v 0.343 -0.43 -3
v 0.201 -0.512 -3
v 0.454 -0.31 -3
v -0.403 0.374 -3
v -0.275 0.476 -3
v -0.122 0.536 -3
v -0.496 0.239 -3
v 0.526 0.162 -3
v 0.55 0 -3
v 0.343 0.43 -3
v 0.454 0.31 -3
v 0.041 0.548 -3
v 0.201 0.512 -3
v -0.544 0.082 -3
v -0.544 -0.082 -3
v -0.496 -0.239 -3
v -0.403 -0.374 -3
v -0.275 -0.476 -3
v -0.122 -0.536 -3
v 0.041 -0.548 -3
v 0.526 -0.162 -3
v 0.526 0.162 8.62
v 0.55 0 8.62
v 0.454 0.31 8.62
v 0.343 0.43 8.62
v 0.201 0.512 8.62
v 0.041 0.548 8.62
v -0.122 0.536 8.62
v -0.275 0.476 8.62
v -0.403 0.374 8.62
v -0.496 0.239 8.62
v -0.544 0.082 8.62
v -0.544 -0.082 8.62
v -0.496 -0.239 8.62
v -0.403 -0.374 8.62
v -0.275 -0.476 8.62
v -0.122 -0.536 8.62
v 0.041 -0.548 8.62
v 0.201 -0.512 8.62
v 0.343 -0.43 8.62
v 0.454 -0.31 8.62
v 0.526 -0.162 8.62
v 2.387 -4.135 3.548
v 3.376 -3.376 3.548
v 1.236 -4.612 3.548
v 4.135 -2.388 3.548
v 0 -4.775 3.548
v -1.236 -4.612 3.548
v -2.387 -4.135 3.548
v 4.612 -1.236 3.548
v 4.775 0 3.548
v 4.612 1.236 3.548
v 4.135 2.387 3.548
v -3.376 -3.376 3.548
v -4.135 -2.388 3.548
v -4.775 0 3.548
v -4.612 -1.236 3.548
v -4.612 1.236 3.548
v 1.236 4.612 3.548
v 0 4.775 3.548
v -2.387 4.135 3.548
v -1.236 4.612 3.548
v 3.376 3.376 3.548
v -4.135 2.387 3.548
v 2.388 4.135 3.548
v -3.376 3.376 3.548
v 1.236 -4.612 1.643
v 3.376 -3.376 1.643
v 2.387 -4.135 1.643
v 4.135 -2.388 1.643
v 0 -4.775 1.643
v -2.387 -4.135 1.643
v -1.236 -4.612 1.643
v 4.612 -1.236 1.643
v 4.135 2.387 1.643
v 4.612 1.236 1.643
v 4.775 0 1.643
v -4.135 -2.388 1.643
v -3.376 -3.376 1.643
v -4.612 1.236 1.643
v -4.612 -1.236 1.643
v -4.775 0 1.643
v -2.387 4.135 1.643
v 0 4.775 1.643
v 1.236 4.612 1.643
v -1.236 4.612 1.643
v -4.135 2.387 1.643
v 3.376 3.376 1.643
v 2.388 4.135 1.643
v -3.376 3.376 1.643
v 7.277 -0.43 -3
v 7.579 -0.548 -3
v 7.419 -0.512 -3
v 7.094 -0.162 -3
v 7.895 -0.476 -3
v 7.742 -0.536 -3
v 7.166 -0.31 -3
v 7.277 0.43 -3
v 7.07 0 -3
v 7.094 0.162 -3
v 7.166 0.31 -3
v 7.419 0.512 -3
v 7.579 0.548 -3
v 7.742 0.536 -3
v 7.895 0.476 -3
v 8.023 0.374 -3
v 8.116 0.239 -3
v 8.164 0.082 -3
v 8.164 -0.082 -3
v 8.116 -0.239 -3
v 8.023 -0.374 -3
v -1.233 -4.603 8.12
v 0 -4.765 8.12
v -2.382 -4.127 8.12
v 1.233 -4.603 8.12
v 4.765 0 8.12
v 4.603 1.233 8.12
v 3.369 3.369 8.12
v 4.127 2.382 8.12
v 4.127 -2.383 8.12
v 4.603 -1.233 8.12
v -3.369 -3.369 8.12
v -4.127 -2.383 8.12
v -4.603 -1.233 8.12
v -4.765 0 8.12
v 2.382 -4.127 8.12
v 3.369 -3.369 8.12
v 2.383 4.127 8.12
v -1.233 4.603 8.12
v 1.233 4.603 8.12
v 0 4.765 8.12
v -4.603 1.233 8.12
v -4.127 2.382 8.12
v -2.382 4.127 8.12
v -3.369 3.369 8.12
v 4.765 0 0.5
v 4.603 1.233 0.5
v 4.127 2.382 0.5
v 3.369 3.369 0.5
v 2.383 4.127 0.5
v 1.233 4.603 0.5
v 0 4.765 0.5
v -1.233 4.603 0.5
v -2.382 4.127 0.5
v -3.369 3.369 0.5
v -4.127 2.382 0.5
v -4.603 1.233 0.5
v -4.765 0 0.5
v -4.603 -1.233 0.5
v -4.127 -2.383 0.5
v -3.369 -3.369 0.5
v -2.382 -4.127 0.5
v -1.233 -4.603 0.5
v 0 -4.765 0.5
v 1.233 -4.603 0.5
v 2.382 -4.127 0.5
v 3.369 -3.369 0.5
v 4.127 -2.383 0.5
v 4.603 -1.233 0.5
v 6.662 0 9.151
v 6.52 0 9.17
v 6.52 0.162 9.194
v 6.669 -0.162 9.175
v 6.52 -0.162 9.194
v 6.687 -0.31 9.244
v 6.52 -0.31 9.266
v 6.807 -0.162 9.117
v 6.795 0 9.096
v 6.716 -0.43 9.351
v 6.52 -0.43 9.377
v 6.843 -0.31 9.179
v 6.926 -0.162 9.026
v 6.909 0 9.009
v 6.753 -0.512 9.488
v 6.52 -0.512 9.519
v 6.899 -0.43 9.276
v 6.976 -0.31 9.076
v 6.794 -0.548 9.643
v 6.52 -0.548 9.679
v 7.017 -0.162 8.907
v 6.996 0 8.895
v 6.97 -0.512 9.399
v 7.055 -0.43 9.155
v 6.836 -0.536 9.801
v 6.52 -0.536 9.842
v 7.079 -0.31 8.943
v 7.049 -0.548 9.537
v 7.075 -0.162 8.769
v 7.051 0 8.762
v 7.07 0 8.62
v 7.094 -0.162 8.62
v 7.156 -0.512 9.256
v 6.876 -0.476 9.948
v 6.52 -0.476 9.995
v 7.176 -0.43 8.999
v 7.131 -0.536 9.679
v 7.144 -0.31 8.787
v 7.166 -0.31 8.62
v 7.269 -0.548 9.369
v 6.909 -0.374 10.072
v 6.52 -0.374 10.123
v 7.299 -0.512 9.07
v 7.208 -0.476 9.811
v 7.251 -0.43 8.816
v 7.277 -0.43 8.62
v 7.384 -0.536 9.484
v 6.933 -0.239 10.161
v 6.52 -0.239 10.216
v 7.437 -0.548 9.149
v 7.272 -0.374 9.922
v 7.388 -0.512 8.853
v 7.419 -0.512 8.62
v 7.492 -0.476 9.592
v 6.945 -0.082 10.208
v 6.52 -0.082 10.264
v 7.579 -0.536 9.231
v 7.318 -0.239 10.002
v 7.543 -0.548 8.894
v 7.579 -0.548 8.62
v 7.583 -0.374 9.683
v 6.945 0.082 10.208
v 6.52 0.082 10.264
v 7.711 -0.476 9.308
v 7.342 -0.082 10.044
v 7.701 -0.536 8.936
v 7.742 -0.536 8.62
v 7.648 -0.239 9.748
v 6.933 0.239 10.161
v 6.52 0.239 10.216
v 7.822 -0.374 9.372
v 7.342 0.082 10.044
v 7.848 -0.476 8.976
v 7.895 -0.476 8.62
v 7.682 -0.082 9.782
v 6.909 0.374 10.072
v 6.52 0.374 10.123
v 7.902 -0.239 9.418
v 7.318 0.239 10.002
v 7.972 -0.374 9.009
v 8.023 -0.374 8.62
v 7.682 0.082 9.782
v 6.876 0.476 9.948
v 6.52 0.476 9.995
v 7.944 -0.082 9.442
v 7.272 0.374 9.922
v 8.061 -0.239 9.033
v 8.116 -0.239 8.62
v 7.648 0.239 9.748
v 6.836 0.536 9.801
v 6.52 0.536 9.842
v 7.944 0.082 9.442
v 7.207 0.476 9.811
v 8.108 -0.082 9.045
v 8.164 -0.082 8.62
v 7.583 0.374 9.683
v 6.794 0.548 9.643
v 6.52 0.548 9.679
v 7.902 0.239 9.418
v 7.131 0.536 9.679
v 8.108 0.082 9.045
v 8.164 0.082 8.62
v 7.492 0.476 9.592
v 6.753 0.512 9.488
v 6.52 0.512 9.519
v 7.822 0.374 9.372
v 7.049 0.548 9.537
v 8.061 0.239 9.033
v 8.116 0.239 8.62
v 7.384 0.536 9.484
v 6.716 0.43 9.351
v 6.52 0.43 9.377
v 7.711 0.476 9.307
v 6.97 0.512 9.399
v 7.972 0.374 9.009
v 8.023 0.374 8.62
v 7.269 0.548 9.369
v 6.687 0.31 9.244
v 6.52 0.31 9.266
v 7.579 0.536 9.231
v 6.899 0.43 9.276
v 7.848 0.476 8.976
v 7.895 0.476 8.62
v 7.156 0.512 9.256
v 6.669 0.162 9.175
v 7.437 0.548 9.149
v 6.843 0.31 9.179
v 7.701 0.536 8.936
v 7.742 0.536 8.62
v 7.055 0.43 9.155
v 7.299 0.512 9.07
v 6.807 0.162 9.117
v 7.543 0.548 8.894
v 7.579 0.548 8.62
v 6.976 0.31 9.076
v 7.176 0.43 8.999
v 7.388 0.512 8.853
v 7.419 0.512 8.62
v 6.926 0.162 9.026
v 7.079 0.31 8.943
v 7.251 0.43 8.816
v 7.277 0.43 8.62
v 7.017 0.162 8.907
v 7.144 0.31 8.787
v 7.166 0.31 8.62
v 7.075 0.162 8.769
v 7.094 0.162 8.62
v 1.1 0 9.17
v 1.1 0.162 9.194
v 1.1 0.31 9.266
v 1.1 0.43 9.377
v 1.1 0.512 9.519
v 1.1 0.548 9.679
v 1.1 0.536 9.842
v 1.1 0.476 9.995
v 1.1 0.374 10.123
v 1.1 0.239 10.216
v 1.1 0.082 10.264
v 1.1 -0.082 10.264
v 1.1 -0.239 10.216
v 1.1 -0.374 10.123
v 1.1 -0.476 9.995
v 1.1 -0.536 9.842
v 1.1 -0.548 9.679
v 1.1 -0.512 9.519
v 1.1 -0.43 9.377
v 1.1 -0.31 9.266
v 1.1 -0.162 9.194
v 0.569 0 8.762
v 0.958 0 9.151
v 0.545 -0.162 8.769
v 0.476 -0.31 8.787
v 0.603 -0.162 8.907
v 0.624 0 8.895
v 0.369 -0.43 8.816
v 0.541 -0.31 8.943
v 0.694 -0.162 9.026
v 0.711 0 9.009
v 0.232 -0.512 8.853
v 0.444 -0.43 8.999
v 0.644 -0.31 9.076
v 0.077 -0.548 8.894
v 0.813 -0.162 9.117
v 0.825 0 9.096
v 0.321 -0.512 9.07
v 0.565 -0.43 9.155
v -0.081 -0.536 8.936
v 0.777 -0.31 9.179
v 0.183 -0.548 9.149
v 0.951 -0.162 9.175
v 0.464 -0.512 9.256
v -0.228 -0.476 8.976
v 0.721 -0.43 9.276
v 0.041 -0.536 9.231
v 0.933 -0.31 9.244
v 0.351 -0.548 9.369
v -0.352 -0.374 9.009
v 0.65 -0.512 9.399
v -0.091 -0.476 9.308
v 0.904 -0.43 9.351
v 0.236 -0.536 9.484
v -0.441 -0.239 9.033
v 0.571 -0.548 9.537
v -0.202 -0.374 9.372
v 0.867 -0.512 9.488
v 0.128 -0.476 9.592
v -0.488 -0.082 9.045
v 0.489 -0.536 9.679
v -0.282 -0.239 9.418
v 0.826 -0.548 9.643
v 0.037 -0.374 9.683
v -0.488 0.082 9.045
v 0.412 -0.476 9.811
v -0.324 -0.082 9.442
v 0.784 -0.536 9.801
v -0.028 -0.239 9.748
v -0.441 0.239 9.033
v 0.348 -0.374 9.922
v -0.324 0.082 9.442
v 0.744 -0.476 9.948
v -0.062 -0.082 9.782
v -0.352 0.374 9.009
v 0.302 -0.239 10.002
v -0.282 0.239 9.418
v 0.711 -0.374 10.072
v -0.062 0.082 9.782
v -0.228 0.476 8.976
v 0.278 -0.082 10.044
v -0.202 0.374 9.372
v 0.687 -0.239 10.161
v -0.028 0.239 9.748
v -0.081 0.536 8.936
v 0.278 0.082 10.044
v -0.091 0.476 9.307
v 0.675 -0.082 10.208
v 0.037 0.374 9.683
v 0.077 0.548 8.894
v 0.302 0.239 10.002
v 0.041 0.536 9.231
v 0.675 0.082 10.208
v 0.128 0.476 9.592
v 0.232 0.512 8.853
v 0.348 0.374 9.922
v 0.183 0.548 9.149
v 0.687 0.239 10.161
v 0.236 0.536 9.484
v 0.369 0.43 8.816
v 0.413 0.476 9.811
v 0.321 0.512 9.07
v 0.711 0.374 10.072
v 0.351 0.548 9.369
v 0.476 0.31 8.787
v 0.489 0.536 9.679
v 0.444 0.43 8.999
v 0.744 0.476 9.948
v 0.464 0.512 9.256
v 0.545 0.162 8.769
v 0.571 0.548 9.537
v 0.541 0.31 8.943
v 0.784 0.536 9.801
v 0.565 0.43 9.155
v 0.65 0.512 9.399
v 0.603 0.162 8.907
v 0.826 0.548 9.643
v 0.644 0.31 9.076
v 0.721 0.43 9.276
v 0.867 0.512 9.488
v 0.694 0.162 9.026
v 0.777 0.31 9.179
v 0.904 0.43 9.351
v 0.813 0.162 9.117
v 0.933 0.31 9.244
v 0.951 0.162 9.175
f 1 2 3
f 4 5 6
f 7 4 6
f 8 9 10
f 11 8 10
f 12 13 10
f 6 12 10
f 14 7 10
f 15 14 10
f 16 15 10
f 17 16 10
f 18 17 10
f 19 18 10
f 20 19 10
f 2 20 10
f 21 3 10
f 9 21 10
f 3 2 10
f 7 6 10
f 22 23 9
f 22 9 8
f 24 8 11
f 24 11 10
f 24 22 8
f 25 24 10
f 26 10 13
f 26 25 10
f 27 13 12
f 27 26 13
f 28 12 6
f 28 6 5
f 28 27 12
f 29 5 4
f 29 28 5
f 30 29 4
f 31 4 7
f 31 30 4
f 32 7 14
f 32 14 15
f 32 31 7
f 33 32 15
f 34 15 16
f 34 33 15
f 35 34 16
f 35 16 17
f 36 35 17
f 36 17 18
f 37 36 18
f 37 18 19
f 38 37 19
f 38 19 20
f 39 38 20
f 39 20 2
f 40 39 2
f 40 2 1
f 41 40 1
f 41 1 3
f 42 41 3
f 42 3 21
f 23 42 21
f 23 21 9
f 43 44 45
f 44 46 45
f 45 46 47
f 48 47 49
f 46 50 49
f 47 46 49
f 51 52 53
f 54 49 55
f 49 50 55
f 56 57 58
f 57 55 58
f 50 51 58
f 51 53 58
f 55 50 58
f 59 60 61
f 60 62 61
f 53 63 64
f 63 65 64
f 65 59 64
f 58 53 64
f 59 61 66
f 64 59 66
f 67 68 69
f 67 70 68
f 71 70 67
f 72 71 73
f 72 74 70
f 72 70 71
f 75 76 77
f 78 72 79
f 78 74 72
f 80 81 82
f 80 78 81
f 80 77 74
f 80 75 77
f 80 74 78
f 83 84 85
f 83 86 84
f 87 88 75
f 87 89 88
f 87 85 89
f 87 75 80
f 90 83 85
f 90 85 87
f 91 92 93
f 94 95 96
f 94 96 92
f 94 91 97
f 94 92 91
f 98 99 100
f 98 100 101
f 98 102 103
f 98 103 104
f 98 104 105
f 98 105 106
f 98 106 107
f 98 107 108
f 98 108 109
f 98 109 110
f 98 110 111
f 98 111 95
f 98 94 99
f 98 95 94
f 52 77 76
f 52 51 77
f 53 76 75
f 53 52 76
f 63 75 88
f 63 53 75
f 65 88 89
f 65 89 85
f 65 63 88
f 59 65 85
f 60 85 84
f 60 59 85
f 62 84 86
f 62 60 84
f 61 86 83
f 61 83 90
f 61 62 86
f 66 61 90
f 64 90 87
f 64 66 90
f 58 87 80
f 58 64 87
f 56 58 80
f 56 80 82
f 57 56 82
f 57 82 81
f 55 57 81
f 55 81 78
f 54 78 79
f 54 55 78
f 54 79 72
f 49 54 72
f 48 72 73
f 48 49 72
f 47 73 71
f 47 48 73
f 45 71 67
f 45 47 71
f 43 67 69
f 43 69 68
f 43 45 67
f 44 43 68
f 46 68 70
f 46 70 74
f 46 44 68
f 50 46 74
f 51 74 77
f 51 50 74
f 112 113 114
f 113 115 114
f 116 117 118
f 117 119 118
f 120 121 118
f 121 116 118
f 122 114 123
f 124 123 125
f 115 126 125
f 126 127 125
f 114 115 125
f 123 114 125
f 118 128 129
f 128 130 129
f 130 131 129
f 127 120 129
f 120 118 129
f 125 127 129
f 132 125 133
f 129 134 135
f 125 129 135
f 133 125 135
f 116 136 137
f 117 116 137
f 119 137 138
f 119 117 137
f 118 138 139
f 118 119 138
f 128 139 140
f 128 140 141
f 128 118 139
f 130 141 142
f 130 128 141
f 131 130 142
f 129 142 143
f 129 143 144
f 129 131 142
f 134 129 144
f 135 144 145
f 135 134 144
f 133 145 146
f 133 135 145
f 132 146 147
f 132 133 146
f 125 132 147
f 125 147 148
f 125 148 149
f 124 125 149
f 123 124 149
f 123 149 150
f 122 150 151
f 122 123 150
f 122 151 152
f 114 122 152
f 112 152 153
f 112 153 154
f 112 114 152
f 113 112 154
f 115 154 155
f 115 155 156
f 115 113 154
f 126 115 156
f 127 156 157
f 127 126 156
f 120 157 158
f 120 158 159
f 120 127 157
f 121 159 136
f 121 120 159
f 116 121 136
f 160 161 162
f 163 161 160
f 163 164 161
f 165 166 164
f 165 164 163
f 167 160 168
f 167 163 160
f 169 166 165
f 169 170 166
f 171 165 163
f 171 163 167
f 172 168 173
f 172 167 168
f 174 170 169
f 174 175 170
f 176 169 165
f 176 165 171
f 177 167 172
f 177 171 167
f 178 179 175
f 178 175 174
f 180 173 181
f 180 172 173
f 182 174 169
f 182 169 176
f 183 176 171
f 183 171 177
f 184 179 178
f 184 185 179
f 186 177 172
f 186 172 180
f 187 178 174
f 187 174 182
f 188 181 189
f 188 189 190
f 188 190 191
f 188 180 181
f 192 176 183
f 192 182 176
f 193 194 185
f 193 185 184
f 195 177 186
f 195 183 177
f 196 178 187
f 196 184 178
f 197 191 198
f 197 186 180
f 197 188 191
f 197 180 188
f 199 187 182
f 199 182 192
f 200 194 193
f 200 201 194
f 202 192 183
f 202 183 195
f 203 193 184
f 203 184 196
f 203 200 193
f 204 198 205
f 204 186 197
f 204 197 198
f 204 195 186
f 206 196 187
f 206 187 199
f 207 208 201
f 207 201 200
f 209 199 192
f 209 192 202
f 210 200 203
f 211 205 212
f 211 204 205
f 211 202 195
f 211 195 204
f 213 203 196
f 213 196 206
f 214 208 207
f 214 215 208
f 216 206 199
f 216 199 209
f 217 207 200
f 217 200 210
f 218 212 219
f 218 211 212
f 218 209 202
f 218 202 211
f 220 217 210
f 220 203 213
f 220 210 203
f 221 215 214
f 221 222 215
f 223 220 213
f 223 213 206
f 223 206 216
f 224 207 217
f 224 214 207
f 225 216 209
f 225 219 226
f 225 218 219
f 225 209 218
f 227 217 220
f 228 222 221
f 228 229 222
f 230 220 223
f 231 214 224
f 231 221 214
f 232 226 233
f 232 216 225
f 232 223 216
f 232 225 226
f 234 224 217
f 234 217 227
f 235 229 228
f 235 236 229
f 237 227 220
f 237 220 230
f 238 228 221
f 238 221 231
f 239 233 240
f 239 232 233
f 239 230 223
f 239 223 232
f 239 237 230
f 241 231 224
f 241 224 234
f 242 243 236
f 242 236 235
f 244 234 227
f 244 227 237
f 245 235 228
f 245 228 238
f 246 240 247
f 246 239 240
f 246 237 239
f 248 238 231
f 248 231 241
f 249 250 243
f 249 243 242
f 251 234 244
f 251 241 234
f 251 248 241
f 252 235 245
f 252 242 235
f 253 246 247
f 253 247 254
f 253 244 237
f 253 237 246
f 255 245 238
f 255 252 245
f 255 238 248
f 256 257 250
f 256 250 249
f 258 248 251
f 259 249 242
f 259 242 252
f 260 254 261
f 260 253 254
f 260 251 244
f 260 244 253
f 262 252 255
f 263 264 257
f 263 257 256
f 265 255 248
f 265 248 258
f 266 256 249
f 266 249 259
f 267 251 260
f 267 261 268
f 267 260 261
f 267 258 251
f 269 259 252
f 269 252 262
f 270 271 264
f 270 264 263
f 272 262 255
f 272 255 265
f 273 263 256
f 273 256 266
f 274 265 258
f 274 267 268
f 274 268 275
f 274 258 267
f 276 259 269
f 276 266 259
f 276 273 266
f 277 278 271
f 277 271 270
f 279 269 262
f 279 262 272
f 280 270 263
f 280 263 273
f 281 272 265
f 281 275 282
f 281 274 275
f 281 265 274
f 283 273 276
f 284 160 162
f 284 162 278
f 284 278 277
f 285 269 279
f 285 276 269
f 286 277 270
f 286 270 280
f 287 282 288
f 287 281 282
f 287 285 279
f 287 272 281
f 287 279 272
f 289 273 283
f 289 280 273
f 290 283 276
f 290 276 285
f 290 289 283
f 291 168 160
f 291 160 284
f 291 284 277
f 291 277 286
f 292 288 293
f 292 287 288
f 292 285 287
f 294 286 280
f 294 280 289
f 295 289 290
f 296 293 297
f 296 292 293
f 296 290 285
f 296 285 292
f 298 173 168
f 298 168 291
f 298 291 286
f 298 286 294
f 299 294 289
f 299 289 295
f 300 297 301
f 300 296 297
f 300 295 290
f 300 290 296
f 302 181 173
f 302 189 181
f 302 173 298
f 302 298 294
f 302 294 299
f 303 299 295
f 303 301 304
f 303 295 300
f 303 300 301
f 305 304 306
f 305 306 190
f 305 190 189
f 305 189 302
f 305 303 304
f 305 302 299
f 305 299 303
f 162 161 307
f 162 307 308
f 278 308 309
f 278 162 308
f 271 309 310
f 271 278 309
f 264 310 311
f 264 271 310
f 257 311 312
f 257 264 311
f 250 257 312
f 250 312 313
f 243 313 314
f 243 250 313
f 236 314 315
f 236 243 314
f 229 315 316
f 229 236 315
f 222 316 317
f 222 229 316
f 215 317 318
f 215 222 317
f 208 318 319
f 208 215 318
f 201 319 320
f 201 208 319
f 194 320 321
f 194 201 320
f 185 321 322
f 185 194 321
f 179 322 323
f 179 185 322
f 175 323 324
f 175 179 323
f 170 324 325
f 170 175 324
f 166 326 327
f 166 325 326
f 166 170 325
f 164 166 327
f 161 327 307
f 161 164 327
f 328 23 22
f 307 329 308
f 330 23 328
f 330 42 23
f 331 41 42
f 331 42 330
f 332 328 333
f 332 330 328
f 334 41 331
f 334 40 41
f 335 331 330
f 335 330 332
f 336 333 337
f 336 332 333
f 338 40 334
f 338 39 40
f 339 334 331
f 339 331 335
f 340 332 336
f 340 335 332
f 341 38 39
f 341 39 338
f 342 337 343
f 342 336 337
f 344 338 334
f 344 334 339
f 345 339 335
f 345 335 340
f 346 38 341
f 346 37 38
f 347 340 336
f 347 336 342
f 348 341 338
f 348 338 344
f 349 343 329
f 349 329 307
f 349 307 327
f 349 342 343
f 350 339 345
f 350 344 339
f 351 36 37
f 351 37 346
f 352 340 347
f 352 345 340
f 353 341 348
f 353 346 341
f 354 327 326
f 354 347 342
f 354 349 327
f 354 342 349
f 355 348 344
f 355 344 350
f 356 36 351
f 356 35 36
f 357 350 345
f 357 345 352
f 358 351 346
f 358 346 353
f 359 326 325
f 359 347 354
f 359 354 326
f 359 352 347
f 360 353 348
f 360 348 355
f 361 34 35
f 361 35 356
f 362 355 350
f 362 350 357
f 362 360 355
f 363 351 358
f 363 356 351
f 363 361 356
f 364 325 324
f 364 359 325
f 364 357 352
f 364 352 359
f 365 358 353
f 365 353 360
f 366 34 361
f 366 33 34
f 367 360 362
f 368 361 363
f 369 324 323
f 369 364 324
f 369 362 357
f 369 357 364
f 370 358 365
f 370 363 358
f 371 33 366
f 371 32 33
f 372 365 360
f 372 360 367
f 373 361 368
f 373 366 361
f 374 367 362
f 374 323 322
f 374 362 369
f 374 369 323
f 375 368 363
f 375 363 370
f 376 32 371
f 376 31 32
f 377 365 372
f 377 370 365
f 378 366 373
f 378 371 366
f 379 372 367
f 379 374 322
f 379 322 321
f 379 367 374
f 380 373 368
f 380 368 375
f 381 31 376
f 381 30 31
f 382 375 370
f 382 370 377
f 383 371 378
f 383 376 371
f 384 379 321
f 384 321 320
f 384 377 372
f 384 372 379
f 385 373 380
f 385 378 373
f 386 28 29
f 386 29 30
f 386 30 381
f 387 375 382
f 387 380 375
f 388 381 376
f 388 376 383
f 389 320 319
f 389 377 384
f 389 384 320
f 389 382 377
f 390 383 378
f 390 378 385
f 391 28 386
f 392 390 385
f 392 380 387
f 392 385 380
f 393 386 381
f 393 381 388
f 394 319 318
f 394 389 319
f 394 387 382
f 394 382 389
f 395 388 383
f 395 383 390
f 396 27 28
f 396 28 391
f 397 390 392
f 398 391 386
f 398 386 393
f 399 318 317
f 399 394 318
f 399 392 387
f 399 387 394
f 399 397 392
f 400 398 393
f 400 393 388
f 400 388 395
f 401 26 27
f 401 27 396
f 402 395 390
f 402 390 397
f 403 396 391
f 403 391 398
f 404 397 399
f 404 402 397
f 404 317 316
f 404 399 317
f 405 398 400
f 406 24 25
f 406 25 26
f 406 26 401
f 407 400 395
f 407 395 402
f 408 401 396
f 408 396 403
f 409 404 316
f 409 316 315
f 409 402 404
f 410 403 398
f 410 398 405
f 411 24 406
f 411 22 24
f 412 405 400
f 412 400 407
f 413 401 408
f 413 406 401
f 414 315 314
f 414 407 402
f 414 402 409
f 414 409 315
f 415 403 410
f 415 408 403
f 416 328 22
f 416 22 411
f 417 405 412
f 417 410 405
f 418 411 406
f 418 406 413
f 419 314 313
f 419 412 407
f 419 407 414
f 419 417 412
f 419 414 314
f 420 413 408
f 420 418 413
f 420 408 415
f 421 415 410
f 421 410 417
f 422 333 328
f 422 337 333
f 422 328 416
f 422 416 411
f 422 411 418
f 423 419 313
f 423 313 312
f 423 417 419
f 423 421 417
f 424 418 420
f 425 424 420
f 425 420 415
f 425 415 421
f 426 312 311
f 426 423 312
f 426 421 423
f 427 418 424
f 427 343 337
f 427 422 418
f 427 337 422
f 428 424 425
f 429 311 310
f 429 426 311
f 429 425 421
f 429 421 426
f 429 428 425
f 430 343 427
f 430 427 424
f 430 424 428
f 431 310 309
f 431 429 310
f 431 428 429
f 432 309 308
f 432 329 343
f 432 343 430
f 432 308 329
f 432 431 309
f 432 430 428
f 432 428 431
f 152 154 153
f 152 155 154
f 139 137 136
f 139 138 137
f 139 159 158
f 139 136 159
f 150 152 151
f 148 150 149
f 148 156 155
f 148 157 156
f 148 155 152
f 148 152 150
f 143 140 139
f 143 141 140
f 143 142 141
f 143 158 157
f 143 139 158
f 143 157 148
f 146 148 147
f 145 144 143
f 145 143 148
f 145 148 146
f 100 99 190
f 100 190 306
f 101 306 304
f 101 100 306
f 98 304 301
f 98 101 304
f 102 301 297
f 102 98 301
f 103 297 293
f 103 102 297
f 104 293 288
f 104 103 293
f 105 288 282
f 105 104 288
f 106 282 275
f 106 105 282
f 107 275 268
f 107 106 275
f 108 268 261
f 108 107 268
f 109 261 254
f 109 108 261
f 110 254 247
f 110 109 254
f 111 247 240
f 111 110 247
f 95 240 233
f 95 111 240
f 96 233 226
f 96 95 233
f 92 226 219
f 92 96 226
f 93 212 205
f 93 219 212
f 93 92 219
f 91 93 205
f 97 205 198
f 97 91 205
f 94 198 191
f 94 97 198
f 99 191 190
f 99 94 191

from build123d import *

# Parameters (mm, degrees)
SKETCH001_R = 0.55
SKETCH002_W = 4.765
SKETCH002_H = 7.62
SKETCH003_W = 4.775
SKETCH003_H = 1.905


with BuildPart() as sweep_body:
    # Sweep: sweep along a path in Sketch
    with BuildLine(Plane.XZ) as sweep_path:
        Line((0, -3), (0, 8.62))
        ThreePointArc((0, 8.62), (0.322183, 9.397817), (1.1, 9.72))
        Line((1.1, 9.72), (6.52, 9.72))
        ThreePointArc((6.52, 9.72), (7.297817, 9.397817), (7.62, 8.62))
        Line((7.62, 8.62), (7.62, -3))
    # Sketch001 → Sweep (sweep)
    with BuildSketch(Plane.XY):
        Circle(SKETCH001_R)
    sweep(path=sweep_path.line)


with BuildPart() as revolution:
    # Sketch002 → Revolution (revolve)
    with BuildSketch(Plane.XZ):
        with Locations((2.3825, 4.31)):
            Rectangle(SKETCH002_W, SKETCH002_H)
    revolve(axis=Axis((0, 0, 0.5), (0, 0, 1)))


with BuildPart() as revolution001:
    # Sketch003 → Revolution001 (revolve)
    with BuildSketch(Plane.XZ):
        with Locations((2.3875, 2.5955)):
            Rectangle(SKETCH003_W, SKETCH003_H)
    revolve(axis=Axis((0, 0, 0), (0, 0, 1)))


solid = Compound([sweep_body.part, revolution.part, revolution001.part])
